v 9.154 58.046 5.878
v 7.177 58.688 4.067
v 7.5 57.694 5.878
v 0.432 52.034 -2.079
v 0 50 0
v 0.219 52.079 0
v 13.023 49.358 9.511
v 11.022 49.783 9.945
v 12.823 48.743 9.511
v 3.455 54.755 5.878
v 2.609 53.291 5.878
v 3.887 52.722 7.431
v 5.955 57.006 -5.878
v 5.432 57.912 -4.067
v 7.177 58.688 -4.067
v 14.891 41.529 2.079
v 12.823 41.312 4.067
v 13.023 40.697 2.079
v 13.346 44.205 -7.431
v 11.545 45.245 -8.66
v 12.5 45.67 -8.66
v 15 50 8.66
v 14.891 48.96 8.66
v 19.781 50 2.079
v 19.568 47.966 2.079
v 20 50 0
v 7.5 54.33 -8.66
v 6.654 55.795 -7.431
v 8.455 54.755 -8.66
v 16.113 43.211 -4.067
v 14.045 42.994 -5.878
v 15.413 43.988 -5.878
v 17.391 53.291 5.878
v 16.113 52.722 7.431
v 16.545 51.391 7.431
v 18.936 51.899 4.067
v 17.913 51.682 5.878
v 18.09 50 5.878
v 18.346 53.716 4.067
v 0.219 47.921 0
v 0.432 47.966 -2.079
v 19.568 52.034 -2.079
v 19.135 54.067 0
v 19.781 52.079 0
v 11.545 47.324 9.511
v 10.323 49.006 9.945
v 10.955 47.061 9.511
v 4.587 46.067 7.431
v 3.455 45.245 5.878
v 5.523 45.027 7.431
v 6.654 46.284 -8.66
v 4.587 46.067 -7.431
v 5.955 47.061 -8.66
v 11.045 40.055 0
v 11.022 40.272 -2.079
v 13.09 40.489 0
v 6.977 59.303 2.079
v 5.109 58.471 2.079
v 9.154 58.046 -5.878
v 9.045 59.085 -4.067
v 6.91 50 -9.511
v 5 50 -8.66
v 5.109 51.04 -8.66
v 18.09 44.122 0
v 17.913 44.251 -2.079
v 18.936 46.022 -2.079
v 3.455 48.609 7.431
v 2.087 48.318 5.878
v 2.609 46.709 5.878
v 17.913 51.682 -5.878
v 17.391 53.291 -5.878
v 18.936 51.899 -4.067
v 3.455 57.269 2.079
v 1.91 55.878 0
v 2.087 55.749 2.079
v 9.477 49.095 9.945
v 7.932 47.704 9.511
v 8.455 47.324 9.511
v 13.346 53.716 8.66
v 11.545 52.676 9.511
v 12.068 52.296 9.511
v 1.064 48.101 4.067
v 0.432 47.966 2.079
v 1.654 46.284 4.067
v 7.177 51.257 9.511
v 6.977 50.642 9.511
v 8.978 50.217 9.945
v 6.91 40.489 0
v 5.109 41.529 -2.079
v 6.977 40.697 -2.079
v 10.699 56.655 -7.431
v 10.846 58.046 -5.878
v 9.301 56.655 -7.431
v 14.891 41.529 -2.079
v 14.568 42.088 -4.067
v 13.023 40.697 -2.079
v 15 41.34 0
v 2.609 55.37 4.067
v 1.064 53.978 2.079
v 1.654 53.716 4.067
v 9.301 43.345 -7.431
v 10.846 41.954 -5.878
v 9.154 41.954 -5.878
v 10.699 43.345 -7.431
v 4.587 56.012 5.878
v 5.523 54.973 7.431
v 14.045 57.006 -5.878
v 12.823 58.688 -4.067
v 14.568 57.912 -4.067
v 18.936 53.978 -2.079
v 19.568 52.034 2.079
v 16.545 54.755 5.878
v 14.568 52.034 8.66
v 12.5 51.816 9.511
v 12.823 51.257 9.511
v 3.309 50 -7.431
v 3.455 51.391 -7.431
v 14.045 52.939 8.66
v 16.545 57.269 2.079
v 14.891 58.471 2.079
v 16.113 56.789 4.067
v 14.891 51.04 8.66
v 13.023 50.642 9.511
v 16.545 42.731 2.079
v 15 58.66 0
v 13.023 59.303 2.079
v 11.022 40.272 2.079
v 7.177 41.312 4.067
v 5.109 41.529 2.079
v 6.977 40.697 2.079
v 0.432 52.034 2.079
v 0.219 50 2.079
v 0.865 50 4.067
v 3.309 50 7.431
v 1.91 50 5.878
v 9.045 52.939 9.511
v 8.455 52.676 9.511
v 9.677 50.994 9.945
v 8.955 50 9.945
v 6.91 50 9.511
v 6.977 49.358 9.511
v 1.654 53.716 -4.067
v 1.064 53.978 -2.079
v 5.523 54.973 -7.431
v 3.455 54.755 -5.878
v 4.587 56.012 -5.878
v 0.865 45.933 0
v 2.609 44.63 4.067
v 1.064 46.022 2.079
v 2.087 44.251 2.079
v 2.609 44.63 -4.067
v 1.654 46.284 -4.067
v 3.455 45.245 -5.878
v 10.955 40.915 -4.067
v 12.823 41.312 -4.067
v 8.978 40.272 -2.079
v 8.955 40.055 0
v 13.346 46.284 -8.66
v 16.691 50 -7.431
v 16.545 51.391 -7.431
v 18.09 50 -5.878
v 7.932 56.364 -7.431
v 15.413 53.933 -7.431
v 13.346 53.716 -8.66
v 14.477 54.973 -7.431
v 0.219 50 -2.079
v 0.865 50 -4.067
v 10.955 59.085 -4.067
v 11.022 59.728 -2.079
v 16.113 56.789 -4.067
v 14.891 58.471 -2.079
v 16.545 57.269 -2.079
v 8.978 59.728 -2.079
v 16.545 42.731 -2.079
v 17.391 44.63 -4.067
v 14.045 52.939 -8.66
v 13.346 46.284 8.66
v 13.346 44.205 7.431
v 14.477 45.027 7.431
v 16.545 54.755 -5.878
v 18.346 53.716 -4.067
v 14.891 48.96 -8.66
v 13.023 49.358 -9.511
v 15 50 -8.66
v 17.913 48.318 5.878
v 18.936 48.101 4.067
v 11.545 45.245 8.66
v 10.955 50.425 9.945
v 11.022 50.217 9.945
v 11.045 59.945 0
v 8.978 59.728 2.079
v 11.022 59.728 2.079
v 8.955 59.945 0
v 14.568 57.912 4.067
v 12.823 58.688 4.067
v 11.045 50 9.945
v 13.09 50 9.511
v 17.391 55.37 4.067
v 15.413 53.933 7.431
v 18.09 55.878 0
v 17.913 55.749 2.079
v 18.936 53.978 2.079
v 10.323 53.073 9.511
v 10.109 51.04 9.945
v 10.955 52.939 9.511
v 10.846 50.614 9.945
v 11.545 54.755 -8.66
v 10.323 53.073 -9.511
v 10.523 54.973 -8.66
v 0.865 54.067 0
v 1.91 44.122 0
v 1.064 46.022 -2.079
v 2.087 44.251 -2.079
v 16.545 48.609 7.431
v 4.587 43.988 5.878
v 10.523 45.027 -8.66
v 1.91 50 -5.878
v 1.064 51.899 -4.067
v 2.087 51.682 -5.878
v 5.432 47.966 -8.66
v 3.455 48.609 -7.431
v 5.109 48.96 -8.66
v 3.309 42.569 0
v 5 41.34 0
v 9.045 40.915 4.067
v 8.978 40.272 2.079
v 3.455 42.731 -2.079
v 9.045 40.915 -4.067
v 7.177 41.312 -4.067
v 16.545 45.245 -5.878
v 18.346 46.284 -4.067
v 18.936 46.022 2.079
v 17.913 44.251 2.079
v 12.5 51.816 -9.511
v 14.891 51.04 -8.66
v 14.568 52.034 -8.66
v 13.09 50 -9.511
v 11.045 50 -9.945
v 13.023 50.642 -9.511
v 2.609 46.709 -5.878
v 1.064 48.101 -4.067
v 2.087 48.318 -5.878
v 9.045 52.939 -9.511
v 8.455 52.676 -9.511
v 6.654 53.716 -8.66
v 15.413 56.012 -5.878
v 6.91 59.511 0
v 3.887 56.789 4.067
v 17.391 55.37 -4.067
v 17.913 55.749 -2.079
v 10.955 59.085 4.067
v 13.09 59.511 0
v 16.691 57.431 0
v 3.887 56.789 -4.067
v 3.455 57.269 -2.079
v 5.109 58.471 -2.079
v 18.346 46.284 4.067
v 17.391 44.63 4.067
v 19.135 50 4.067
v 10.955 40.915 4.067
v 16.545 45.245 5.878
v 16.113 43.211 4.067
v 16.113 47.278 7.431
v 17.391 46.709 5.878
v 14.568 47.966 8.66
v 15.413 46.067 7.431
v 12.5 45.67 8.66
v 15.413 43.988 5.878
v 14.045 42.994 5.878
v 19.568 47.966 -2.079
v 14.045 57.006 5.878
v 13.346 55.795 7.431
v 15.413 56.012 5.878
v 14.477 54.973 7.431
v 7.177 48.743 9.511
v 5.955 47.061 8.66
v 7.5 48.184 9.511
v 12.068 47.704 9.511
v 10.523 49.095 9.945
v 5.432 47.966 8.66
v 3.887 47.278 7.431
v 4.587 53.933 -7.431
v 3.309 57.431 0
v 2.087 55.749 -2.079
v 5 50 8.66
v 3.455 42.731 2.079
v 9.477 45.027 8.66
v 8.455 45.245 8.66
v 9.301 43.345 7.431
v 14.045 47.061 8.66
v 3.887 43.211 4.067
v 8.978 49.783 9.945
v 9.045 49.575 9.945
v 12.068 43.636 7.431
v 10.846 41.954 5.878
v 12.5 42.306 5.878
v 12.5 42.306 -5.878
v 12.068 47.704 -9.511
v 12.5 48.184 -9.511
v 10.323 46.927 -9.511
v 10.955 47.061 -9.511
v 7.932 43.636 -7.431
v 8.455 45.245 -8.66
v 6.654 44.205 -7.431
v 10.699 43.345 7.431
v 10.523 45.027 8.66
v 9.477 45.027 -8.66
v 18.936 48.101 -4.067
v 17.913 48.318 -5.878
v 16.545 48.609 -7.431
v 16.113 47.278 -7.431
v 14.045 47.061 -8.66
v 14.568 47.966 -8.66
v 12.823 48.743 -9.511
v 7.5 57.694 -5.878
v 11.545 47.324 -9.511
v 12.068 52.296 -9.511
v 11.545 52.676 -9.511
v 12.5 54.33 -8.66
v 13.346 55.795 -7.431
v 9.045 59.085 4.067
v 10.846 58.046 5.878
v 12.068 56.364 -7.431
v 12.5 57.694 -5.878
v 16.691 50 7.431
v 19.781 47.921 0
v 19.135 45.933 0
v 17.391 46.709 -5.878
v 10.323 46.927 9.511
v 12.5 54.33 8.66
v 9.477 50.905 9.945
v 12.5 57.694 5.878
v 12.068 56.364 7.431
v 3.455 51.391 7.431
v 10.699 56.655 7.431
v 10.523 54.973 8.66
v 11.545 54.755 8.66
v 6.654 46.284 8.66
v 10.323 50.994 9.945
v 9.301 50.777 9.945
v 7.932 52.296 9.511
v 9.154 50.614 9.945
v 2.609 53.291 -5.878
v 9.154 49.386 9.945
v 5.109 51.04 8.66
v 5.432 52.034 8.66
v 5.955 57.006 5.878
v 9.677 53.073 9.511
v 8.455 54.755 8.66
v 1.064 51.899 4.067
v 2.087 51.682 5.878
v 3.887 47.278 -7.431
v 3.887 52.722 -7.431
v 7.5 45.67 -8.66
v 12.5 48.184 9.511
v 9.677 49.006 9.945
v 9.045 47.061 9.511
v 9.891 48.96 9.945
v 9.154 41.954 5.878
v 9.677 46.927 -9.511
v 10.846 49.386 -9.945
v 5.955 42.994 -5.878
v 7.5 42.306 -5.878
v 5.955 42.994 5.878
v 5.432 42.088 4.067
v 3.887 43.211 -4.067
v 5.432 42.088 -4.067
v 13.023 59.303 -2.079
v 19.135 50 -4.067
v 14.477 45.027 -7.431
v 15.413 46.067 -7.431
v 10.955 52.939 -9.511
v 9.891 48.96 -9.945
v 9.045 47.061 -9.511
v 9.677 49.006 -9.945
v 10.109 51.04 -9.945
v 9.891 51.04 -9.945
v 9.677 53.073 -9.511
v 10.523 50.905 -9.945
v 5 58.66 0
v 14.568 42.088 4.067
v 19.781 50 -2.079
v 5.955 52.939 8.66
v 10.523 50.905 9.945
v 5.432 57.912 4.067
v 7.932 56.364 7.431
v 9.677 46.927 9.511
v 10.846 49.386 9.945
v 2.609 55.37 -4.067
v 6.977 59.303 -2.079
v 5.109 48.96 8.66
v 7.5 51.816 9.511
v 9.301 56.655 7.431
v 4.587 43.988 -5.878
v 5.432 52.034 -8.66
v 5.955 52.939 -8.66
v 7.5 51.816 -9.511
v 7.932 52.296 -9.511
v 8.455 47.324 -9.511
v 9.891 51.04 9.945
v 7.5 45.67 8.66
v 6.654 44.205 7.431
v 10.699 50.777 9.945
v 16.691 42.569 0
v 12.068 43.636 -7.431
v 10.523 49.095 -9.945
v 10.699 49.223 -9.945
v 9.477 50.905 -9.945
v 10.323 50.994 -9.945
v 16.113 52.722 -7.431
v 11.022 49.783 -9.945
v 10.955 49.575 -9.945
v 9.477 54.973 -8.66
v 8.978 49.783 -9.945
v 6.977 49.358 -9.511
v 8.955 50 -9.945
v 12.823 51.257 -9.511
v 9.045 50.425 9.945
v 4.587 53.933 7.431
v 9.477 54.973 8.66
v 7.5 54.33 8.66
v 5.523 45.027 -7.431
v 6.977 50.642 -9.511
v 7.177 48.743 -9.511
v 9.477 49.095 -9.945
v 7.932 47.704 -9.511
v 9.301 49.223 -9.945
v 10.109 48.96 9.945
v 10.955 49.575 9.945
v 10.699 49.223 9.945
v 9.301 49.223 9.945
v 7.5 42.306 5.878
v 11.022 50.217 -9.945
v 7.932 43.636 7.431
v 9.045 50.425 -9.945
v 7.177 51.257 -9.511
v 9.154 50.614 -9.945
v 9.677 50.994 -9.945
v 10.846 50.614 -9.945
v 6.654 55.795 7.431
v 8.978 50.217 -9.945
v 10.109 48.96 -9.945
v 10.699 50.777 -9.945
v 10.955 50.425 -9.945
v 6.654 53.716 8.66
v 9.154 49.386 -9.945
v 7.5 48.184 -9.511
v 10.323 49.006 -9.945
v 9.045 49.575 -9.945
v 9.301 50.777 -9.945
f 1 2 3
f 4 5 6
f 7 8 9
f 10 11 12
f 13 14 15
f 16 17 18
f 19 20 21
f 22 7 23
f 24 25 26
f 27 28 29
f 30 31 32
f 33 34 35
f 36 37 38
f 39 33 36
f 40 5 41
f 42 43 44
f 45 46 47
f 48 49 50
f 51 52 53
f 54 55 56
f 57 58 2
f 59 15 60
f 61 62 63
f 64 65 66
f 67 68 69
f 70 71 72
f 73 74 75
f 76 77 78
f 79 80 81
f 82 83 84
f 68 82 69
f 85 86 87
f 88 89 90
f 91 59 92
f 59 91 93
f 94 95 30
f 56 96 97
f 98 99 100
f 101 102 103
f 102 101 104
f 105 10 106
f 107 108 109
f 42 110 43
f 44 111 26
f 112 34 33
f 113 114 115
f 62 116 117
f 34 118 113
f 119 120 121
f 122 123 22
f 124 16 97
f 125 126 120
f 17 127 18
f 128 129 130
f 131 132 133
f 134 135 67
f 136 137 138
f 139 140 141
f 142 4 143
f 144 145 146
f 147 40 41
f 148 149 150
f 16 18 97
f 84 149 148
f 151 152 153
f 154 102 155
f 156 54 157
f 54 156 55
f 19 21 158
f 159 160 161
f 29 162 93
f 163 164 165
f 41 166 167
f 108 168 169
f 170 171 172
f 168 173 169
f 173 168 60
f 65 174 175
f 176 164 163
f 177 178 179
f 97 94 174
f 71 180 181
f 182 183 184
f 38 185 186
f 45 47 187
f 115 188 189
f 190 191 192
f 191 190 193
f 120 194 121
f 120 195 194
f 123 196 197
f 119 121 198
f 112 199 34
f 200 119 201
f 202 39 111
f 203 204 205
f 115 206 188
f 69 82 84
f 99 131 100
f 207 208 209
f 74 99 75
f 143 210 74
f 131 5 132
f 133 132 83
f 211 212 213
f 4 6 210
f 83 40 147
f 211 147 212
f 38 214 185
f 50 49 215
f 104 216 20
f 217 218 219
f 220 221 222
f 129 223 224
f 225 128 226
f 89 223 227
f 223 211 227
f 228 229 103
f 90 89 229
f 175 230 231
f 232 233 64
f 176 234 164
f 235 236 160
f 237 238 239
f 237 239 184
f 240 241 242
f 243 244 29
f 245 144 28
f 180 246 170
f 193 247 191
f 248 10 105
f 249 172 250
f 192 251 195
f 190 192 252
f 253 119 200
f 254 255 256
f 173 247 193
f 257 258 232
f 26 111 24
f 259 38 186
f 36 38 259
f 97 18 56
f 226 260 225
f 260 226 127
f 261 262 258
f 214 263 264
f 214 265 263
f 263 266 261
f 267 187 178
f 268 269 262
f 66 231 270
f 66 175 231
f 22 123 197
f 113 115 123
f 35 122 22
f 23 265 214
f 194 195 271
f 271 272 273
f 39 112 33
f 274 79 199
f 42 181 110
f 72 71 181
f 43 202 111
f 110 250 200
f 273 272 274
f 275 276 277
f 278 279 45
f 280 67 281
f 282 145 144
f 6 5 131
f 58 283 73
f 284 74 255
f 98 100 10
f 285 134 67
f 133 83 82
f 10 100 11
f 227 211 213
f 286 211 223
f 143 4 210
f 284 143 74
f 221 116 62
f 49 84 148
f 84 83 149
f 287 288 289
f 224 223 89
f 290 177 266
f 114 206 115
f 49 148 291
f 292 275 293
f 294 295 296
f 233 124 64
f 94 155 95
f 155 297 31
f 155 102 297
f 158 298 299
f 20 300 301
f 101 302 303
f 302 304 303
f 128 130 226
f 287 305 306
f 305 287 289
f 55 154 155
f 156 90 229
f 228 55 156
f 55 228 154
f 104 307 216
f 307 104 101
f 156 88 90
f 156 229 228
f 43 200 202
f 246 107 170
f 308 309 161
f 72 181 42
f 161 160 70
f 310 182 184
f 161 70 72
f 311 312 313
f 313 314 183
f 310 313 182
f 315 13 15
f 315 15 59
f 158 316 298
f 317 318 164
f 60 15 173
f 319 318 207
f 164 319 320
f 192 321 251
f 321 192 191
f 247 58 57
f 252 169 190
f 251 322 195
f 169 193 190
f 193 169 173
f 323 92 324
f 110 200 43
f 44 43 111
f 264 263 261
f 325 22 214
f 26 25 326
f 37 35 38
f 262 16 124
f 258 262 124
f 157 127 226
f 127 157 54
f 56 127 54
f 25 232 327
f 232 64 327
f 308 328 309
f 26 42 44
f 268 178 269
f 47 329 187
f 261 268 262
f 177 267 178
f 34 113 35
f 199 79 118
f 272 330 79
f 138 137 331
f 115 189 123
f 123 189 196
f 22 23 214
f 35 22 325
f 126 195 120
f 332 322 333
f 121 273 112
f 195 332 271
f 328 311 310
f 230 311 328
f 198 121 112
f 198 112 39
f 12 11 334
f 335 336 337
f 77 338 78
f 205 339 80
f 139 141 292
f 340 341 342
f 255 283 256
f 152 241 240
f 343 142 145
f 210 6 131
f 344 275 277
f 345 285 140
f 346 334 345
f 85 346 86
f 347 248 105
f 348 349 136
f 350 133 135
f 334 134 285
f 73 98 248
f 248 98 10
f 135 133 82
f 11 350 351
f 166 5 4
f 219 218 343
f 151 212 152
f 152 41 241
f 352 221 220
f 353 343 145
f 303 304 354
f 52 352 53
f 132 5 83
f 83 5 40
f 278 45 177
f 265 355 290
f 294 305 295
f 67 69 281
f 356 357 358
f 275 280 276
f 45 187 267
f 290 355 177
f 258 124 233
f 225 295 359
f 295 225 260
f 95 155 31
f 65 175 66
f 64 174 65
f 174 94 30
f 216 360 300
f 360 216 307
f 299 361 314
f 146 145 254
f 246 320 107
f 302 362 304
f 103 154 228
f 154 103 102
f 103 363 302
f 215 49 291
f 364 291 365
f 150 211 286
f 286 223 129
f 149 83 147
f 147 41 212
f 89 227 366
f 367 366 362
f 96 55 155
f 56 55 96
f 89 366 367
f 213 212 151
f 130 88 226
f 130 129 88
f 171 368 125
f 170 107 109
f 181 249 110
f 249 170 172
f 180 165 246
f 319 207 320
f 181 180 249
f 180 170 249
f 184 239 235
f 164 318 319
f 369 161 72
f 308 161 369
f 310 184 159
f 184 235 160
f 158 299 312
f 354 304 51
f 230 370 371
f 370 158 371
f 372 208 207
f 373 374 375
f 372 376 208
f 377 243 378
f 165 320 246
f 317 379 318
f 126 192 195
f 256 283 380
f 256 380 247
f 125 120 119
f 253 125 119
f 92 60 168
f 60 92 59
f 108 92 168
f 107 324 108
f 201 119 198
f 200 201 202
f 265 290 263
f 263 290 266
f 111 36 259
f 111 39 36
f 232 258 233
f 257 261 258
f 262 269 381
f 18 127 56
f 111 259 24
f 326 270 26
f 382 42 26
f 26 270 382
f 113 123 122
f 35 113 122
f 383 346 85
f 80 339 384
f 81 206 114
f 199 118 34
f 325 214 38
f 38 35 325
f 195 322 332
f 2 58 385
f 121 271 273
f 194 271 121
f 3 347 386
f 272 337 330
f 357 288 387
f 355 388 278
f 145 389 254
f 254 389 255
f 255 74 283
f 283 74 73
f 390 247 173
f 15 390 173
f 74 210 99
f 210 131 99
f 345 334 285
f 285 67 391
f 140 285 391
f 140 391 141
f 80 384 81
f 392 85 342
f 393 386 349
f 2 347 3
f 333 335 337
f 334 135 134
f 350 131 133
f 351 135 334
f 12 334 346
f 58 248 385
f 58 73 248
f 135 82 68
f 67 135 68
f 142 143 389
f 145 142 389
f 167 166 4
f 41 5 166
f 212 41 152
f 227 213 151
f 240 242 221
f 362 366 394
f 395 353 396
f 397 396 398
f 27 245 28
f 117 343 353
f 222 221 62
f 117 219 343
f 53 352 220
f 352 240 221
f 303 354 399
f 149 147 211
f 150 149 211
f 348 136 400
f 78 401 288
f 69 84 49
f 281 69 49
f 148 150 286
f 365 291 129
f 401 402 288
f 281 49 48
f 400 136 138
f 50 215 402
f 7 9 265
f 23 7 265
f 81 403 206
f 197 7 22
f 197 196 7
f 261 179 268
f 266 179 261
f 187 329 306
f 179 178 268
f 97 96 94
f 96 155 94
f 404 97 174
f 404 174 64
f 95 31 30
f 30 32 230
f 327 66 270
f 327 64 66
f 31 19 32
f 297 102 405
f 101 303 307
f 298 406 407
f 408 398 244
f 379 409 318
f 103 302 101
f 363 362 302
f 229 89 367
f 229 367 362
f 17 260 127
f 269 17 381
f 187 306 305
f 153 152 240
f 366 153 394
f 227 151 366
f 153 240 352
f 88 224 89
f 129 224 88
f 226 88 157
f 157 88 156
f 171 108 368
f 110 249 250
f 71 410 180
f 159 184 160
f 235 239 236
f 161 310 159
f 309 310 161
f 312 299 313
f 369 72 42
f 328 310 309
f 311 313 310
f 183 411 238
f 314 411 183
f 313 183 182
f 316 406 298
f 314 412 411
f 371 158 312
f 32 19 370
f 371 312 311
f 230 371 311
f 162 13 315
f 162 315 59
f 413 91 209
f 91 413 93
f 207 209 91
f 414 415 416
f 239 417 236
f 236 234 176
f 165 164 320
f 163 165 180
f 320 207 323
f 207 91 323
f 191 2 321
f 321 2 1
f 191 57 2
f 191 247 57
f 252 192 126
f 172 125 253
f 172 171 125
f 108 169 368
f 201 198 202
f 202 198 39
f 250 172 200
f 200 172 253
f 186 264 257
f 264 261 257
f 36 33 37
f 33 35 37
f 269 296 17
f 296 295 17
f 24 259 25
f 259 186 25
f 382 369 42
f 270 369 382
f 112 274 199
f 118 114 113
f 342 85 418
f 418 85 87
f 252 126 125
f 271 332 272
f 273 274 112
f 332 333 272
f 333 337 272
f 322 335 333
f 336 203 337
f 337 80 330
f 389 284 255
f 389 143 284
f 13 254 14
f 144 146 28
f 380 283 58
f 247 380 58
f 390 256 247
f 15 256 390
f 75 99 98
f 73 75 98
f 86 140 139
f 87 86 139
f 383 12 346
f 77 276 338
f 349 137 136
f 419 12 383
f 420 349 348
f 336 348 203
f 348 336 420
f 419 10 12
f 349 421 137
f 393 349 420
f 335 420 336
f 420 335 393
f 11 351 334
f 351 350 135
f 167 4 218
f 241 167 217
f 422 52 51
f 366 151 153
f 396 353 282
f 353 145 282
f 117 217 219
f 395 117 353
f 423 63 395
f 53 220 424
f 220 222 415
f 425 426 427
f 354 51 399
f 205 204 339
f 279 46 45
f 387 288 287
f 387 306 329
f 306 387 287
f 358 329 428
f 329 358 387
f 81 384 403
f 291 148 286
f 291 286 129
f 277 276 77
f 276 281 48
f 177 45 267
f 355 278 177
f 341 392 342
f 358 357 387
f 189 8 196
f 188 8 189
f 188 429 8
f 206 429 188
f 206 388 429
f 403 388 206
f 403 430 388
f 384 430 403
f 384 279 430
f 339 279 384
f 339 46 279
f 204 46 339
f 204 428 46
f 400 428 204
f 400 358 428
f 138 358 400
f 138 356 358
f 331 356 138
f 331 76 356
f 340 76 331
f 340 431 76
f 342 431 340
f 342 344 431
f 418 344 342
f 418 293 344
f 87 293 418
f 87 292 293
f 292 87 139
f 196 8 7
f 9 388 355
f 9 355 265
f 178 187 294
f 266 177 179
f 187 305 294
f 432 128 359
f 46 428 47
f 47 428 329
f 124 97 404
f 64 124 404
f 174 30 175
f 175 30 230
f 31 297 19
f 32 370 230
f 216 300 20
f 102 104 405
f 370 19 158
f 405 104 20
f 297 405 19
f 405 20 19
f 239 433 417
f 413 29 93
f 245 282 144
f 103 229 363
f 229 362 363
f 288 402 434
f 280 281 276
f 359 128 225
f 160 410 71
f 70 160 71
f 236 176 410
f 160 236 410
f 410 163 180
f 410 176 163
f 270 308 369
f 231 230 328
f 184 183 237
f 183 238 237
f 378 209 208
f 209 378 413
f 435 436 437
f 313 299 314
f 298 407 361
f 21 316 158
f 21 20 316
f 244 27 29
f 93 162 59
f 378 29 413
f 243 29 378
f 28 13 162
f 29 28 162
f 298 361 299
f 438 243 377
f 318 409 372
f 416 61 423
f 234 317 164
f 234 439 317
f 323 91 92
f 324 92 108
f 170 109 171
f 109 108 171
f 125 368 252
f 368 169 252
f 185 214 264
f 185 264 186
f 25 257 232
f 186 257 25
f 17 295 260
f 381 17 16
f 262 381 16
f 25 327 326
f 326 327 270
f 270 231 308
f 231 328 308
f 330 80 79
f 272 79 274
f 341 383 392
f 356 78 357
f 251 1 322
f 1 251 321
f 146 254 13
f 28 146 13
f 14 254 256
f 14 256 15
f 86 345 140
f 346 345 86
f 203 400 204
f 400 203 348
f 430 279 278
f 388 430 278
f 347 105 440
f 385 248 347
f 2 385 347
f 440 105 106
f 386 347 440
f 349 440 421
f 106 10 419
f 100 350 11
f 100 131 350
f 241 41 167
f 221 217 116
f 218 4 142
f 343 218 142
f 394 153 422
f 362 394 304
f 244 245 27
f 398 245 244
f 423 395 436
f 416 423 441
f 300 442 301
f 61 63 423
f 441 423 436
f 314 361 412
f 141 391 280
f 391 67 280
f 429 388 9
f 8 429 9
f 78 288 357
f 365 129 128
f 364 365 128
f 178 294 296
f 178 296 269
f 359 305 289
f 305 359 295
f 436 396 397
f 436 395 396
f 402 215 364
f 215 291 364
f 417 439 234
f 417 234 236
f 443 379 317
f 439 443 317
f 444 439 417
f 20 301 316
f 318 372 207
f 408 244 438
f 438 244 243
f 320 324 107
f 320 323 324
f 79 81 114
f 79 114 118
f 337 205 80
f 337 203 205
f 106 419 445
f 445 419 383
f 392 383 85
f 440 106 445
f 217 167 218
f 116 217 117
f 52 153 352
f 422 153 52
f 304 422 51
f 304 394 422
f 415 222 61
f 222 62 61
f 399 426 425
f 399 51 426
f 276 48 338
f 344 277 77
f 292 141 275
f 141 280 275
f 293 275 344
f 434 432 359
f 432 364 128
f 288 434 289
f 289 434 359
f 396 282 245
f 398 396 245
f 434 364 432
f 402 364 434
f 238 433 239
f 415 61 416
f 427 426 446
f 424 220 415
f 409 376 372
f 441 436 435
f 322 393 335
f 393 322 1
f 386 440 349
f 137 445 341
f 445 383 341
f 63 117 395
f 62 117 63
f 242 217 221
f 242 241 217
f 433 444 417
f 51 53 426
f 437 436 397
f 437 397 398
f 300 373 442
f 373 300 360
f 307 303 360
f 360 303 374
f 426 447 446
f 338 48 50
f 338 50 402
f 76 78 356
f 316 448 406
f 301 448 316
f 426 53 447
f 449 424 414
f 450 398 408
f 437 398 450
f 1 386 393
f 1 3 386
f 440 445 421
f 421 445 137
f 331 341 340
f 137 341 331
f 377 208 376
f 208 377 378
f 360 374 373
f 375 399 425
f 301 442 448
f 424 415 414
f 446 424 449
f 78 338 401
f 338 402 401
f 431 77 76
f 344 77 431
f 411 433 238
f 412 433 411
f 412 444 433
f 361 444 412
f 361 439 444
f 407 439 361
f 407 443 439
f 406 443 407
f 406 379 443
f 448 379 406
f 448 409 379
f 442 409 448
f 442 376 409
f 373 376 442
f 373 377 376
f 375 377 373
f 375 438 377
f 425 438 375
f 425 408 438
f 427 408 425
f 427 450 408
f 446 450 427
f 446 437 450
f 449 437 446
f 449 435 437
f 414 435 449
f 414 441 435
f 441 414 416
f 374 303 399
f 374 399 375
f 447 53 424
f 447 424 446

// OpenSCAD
// This indicates the revolute joint.
// 
// The revolute is generically modelled as
// a coincident point and parallel constraint.

color("red", 0.5){
translate([10,50,0])
  sphere(10);
  rotate([5,20,0])
    square([300,300], true);
}

color("green", 0.5){
translate([10,50,0])
  sphere(10);
  rotate([5,20,0])
    square([300,300], true);
}
